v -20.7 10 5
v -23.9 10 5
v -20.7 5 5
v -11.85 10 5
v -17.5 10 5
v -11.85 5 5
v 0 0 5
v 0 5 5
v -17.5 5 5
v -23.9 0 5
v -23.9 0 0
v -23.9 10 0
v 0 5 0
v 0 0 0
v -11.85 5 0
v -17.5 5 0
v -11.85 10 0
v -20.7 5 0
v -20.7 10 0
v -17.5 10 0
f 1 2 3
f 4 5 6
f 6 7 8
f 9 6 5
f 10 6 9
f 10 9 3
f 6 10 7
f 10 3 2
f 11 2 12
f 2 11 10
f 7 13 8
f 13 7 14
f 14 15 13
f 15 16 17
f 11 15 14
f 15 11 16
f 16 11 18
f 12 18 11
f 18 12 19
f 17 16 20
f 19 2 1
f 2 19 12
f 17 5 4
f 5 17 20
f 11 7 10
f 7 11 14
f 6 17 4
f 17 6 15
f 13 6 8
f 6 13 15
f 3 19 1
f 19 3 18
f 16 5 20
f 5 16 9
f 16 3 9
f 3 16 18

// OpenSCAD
$fa=1;
$fs=0.4;

// base
module base(x=12, y=12, z=12)
{
    cube([x, y, z], center=false);
}

// stand cutout
module stand_cutout(width=1, length=1, height=1)
{
    cube([width, length, height], center=false);
}

// stand cutout
module pcb_cutout(width=1, length=1, height=1)
{
    cube([width, length, height], center=false);
}

module spacer(width=1, length=1, height=1, pcb_height, pcb_thickness)
{
    difference(){
        base(width, length, height);
        translate([-width/2,length/2,-0.1])
        #stand_cutout(2*width, length, 0.5*height);
        translate([-width/2,length/2, pcb_height])
        #pcb_cutout(2*width, length, pcb_thickness);
    }
}

// pcb thickness 3.2mm
// spacer height 17.5mm
pcb_height = 17.5;
pcb_thickness = 3.2;
spacer_width = 5;
spacer_length = 10;
spacer_height = pcb_height + 2*pcb_thickness;
rotate([0,-90,0])
    spacer(spacer_width, spacer_length, spacer_height, pcb_height, pcb_thickness);
